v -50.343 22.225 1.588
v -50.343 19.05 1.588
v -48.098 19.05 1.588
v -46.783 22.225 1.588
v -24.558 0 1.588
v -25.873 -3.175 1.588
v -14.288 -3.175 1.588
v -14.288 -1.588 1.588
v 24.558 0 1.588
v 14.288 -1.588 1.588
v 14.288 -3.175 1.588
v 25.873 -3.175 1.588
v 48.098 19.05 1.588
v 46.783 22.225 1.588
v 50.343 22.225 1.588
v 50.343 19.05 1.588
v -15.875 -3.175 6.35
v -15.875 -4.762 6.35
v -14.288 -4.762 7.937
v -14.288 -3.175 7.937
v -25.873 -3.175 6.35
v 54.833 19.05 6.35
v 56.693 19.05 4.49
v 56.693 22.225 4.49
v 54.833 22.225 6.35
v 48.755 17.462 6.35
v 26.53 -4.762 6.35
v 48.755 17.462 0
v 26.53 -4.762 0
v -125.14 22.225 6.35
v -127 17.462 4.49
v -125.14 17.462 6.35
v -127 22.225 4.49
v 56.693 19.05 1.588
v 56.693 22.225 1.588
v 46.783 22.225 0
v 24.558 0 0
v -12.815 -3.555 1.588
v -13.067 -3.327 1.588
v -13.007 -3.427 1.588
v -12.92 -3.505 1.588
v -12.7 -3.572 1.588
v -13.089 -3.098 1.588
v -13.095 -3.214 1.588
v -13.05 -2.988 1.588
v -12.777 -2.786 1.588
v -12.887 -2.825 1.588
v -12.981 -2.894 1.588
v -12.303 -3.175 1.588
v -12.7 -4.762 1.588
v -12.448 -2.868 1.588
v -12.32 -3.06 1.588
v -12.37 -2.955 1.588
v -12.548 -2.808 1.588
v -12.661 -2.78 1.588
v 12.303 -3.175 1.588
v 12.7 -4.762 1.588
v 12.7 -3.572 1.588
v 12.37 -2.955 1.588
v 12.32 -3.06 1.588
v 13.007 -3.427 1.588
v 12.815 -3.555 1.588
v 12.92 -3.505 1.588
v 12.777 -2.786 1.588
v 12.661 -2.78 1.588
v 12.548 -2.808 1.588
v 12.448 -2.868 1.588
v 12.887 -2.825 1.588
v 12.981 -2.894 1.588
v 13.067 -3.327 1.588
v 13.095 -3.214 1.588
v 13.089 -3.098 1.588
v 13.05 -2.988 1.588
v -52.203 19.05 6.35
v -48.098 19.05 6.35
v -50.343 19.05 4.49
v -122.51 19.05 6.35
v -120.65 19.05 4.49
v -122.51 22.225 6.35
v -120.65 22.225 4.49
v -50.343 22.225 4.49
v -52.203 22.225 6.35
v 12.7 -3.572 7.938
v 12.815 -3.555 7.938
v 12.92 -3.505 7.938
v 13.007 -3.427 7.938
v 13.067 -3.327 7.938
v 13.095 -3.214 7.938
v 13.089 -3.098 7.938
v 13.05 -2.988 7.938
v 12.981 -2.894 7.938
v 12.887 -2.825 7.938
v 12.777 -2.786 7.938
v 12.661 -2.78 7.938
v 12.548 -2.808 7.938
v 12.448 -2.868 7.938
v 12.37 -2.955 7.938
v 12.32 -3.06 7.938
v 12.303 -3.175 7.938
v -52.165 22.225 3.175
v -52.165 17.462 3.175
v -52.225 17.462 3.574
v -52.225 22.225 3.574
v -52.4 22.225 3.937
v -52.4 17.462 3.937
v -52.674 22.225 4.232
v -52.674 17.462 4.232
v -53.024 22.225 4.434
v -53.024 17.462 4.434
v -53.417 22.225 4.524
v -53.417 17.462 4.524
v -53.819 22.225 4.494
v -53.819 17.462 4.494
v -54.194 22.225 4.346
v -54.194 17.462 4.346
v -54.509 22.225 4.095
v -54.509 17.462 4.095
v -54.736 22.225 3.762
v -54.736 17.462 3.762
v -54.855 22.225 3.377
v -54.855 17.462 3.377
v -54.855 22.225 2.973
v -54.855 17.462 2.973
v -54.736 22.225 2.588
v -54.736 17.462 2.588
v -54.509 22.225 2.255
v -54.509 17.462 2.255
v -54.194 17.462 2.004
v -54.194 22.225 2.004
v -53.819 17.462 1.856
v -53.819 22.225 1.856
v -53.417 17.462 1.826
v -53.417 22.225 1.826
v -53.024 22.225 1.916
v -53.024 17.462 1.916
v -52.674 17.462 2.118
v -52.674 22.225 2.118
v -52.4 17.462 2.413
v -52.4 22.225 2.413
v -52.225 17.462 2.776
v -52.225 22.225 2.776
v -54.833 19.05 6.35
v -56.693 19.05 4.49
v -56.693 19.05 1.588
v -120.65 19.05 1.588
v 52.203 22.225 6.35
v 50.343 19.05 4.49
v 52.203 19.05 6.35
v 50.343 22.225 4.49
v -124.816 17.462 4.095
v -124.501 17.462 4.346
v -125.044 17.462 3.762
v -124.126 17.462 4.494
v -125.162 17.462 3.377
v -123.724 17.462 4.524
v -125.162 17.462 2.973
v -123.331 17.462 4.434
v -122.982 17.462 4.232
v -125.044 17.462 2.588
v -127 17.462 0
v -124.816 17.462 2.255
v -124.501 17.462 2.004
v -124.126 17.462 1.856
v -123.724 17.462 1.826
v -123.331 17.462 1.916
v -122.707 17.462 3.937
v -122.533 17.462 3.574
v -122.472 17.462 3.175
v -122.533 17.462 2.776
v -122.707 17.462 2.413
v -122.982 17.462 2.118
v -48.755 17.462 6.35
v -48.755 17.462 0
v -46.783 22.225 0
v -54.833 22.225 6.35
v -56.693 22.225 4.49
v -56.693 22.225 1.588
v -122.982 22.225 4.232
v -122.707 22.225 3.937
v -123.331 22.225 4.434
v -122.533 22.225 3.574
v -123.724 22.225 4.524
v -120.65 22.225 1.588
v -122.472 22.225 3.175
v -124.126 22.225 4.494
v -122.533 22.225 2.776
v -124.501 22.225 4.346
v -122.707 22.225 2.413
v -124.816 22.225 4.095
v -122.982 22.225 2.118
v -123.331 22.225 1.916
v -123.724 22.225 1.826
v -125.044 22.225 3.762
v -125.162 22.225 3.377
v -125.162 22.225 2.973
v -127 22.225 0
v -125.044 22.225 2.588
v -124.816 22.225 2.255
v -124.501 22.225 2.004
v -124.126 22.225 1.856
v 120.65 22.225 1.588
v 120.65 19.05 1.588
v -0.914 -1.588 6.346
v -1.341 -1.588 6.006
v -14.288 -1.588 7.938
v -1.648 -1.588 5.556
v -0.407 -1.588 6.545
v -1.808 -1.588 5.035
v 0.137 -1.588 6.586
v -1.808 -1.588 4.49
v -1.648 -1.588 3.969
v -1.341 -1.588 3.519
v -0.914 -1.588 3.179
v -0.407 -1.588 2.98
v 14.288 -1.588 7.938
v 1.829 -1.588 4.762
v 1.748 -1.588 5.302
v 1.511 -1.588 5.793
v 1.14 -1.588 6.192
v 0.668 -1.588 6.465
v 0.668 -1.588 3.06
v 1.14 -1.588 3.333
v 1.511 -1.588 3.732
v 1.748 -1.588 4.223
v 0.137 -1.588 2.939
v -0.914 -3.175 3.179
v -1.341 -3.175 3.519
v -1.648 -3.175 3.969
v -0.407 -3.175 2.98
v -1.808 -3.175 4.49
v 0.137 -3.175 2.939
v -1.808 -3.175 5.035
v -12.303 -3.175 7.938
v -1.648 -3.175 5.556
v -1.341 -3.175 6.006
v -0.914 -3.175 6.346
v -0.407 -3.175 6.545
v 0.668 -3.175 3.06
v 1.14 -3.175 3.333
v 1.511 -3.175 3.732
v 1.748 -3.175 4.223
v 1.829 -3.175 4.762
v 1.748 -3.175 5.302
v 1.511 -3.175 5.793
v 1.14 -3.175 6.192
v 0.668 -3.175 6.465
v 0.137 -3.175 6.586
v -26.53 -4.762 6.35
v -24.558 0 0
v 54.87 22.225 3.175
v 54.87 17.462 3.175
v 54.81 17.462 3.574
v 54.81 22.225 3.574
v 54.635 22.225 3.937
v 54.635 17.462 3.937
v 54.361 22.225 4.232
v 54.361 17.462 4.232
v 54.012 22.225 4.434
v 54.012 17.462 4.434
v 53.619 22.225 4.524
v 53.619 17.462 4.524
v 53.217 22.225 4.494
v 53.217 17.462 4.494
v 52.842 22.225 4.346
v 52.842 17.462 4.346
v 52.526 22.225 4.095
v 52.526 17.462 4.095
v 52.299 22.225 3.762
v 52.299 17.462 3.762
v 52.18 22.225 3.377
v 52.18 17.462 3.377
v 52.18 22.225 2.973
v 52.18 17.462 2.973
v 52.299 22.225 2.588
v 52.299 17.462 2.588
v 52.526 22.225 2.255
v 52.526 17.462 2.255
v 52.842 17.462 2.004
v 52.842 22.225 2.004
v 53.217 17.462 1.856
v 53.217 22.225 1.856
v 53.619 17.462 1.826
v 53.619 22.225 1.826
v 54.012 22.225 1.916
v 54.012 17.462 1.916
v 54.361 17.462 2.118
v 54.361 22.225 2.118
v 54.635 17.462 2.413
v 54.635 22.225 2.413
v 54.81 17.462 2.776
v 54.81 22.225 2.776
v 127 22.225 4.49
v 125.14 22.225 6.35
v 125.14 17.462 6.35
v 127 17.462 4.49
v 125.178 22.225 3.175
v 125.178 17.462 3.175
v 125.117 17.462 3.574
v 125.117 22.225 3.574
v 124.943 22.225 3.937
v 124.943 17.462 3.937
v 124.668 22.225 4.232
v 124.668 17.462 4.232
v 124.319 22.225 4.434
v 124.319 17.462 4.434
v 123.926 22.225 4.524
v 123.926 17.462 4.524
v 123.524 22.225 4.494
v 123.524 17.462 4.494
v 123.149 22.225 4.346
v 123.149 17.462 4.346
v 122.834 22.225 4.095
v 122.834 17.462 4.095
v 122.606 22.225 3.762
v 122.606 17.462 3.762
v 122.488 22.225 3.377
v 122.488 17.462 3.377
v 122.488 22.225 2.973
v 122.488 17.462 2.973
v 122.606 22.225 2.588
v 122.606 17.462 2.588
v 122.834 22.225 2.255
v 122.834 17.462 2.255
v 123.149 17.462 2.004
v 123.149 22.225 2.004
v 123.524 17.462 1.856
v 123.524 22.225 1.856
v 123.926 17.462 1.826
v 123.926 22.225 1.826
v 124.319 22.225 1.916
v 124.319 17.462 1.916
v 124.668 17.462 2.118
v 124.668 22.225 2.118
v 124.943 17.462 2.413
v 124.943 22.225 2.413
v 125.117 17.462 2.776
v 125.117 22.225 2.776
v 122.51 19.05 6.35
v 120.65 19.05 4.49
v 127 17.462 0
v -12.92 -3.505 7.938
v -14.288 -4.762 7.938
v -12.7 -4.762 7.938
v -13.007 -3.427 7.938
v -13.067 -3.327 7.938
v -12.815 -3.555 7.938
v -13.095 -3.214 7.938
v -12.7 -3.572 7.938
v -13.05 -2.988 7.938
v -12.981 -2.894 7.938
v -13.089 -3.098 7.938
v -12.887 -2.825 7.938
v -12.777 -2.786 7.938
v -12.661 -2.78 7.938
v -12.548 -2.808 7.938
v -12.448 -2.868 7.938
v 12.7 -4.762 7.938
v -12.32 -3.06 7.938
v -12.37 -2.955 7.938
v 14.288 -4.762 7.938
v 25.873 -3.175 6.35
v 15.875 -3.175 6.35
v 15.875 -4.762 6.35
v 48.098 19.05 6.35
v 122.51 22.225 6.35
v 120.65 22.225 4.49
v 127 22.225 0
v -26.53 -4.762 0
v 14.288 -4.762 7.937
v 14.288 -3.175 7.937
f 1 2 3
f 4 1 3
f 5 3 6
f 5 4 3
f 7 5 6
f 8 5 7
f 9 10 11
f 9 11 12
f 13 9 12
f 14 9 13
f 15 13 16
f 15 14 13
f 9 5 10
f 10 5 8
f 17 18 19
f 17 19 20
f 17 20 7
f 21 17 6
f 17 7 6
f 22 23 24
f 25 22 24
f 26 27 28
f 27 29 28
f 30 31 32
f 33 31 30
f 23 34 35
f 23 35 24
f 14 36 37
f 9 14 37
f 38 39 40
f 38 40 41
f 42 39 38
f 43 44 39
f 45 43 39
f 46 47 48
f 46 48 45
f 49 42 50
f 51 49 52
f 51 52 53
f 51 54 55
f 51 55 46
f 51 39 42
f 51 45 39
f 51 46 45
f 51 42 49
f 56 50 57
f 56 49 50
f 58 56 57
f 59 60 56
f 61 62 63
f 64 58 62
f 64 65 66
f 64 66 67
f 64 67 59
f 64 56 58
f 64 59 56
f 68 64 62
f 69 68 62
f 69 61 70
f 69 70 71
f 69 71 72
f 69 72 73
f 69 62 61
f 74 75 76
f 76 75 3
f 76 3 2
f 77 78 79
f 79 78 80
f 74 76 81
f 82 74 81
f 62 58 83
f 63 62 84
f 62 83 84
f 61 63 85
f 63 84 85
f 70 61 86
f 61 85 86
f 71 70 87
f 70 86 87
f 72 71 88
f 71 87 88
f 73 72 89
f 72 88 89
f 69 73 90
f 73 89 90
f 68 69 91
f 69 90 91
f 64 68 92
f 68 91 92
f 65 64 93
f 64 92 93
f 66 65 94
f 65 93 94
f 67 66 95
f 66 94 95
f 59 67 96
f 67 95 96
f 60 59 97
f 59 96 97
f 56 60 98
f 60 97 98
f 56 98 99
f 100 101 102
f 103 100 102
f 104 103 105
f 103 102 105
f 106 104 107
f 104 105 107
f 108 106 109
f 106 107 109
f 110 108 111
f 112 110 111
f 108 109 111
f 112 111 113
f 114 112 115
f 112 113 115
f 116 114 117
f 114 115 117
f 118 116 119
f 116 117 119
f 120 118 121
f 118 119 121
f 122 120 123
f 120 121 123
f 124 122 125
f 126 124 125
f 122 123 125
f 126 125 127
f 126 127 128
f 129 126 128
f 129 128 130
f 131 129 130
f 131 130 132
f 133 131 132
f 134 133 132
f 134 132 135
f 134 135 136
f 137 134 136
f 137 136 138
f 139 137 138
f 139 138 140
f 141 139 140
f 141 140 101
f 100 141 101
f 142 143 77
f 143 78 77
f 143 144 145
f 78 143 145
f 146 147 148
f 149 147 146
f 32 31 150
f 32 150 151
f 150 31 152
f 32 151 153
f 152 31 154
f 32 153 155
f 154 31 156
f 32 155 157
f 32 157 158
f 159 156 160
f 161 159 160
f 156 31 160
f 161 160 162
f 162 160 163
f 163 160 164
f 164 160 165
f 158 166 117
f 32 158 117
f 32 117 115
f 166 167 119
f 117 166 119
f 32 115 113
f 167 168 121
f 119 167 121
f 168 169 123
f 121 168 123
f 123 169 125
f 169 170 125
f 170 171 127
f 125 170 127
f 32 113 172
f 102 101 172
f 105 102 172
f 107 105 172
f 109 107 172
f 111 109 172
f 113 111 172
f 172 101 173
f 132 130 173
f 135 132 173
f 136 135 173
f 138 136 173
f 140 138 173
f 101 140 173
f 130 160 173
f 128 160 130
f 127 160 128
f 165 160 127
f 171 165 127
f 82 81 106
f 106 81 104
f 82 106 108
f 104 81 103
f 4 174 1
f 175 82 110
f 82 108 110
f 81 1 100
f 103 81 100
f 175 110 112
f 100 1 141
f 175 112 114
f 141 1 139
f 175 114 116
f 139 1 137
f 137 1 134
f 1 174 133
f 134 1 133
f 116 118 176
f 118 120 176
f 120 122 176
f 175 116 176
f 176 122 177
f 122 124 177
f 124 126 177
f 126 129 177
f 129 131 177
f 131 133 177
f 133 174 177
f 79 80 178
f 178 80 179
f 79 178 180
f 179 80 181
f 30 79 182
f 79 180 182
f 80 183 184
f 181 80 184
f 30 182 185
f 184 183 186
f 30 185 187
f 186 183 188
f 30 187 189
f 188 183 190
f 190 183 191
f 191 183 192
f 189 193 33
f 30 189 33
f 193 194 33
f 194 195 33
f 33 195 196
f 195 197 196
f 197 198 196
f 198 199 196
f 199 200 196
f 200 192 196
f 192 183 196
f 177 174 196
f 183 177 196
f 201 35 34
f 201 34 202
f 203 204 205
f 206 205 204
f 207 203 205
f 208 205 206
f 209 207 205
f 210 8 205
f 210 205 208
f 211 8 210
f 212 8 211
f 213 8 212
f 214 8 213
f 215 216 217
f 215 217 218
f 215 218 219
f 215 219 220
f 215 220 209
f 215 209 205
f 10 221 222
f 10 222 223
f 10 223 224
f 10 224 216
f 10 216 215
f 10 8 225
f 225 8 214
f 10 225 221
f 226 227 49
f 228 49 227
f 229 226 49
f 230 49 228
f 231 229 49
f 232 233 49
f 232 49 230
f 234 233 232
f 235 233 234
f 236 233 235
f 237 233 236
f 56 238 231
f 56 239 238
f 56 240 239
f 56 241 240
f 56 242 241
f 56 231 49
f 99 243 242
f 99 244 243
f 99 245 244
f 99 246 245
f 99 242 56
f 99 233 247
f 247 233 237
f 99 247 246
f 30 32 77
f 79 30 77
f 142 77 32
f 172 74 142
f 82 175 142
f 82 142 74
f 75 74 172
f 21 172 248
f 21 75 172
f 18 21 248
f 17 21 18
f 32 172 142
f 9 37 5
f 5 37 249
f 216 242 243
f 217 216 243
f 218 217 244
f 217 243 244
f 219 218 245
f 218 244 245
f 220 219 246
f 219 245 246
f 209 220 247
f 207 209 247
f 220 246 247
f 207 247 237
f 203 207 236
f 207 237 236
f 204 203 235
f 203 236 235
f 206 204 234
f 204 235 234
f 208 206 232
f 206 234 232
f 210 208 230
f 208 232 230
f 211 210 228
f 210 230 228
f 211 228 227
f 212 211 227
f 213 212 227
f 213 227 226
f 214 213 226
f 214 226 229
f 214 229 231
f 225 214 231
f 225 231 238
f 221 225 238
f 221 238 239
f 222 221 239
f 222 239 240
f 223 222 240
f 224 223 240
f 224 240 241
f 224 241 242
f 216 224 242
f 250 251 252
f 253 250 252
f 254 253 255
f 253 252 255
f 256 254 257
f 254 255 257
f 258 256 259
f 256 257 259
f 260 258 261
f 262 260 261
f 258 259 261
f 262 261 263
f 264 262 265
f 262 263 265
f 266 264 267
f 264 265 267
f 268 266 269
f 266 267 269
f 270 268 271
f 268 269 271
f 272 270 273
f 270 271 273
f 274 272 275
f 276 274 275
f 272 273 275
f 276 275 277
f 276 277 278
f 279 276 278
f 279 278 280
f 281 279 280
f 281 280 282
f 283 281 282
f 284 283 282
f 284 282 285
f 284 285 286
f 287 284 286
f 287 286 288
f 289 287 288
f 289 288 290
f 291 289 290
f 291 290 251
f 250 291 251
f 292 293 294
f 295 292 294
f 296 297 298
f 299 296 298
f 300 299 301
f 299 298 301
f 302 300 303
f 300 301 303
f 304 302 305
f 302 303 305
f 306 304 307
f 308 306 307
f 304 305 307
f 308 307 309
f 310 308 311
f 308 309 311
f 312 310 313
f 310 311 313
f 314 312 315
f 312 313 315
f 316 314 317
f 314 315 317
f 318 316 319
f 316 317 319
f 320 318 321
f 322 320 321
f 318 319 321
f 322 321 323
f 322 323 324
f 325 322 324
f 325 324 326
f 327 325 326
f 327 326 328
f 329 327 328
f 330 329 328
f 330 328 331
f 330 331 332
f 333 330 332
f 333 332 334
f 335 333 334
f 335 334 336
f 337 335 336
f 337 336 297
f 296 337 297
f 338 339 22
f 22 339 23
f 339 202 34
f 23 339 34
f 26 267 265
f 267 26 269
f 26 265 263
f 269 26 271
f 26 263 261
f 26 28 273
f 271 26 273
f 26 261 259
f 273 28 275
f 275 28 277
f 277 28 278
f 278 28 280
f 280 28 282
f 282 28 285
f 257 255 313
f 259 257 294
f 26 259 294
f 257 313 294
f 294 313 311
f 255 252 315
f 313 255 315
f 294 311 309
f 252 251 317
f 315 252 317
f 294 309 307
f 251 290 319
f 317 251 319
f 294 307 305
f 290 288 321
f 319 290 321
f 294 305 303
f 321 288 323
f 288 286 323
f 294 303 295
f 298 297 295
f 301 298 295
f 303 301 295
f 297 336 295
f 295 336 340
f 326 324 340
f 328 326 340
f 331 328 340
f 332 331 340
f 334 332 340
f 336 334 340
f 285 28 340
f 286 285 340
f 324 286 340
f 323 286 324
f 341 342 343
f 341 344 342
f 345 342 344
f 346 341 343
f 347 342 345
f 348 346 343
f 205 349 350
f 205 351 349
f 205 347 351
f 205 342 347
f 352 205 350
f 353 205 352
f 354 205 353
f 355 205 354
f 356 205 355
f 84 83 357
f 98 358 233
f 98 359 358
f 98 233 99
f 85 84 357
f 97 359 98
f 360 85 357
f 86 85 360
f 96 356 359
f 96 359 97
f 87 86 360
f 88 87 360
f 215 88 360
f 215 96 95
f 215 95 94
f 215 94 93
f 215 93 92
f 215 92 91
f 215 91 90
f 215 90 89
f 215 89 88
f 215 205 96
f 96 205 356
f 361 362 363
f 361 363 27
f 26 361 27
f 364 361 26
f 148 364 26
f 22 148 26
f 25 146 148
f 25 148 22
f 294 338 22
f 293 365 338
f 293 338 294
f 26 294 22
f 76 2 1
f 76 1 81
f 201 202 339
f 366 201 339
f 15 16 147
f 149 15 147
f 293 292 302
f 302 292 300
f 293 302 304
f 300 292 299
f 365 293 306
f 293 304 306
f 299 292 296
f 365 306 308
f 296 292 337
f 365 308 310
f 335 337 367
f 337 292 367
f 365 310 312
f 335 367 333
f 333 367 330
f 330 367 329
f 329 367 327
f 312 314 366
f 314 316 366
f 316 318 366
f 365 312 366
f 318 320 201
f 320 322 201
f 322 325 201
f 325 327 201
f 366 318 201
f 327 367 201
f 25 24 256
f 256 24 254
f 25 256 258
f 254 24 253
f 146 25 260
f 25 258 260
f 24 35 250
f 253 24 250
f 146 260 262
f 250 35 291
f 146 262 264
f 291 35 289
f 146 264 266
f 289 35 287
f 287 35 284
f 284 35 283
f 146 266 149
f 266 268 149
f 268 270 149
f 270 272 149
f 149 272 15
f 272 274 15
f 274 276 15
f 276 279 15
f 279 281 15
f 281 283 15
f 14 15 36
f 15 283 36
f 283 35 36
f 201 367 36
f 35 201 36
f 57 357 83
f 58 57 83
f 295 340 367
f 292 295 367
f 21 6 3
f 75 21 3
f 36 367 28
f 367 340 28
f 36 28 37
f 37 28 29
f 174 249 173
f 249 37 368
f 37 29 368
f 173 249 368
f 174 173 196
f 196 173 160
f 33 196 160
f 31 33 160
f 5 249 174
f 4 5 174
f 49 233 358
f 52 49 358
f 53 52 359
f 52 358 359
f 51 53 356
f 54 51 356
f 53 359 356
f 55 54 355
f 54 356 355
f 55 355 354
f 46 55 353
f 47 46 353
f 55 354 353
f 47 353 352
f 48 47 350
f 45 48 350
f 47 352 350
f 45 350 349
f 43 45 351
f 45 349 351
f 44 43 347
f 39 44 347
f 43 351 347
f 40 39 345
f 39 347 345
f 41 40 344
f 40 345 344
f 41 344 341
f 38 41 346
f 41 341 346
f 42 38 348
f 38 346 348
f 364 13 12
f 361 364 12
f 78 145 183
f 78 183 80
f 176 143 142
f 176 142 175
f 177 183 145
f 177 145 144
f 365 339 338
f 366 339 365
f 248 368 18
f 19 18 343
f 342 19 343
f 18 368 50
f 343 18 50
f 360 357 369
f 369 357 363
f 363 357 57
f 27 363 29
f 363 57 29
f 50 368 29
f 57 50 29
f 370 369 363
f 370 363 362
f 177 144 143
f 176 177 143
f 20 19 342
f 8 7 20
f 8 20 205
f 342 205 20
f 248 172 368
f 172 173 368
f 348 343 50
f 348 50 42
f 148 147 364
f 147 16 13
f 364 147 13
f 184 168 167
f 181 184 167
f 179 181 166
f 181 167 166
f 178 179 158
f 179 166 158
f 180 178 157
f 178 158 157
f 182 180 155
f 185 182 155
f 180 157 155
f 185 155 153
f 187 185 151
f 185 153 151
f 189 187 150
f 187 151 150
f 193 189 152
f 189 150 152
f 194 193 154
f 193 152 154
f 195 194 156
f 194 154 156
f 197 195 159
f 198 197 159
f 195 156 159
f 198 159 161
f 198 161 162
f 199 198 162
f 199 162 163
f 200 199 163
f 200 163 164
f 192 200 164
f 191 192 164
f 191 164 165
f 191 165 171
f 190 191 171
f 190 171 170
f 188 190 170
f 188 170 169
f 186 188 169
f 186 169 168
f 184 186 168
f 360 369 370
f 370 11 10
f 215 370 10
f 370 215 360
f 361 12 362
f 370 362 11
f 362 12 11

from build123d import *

# Parameters (mm, degrees)
F1_DEPTH  = 1.5875
F3_DEPTH  = 4.7625
F4_W      = 6.35
F4_H      = 6.35
F5_DEPTH  = 3.175
F6_SIZE   = 1.8598642
F7_W      = 28.575
F7_H      = 3.175
F8_DEPTH  = 1.5875
F9_W      = 25.4
F9_H      = 1.5875
F10_DEPTH = 6.35
F11_SIZE  = 1.58749
F12_R     = 1.35255
F12_R_2   = 1.8288
F13_DEPTH = 25.4
F14_R     = 0.396875
F15_DEPTH = 6.35


# Not quite as in the source:
# - a fillet or chamfer is up to 0.001 mm smaller than in the source, because OpenCascade refuses the exact size


with BuildPart() as f1:
    # F0 (on Top) → F1 (new body)
    with BuildSketch(Plane.XY):
        Polygon((-46.7826079092, 22.225), (-127, 22.225), (-127, 17.4625), (-48.7553, 17.4625), (-26.5303, -4.7625), (26.5303, -4.7625), (48.7553, 17.4625), (127, 17.4625), (127, 22.225), (46.7826079092, 22.225), (24.5576079092, 0), (-24.5576079092, 0), align=None)
    extrude(amount=F1_DEPTH)

    # F2 (on face) → F3 (join)
    with BuildSketch(Plane.XY.offset(1.5875)):
        Polygon((-127, 19.05), (-127, 17.4625), (-48.7553, 17.4625), (-26.5303, -4.7625), (26.5303, -4.7625), (48.7553, 17.4625), (127, 17.4625), (127, 19.05), (48.0977359697, 19.05), (25.8727359697, -3.175), (14.2875, -3.175), (14.2875, -1.5875), (-14.2875, -1.5875), (-14.2875, -3.175), (-25.8727359697, -3.175), (-48.0977359697, 19.05), align=None)
    extrude(amount=F3_DEPTH)

    # F4 (on face) → F5 (join, through all)
    with BuildSketch(Plane(origin=(0, 19.05, 0), x_dir=(-1, 0, 0), z_dir=(0, 1, 0))):
        with Locations((-53.5178, 3.175)):
            Rectangle(F4_W, F4_H)
        with Locations((-123.825, 3.175)):
            Rectangle(F4_W, F4_H)
        with Locations((123.825, 3.175)):
            Rectangle(F4_W, F4_H)
        with Locations((53.5178, 3.175)):
            Rectangle(F4_W, F4_H)
    extrude(amount=F5_DEPTH)

    # F6
    f6_edges = [f1.edges().sort_by_distance(p)[0] for p in [
        (-127, 19.84375, 6.35),
        (-120.65, 20.6375, 6.35),
        (-56.6928, 20.6375, 6.35),
        (-50.3428, 20.6375, 6.35),
        (50.3428, 20.6375, 6.35),
        (56.6928, 20.6375, 6.35),
        (120.65, 20.6375, 6.35),
        (127, 19.84375, 6.35),
    ]]
    chamfer(f6_edges, length=F6_SIZE)

    # F7 (on face) → F8 (join)
    with BuildSketch(Plane.XY.offset(6.35)):
        with Locations((0, -3.175)):
            Rectangle(F7_W, F7_H)
    extrude(amount=F8_DEPTH)

    # F9 (on face) → F10 (cut, through all)
    with BuildSketch(Plane.XY.offset(7.9375)):
        with Locations((0, -3.96875)):
            Rectangle(F9_W, F9_H)
    extrude(amount=-F10_DEPTH, mode=Mode.SUBTRACT)

    # F11 (size 1.5875 in the source; OpenCascade refuses exactly that, so slightly less here)
    f11_edges = [f1.edges().sort_by_distance(p)[0] for p in [
        (-14.2875, -3.96875, 6.35),
        (14.2875, -3.96875, 6.35),
    ]]
    chamfer(f11_edges, length=F11_SIZE)

    # F12 (on face) → F13 (cut, through all)
    with BuildSketch(Plane.XZ.offset(3.175)):
        with Locations((53.5178, 3.175)):
            Circle(F12_R)
        with Locations((123.825, 3.175)):
            Circle(F12_R)
        with Locations((-123.825, 3.175)):
            Circle(F12_R)
        with Locations((-53.5178, 3.175)):
            Circle(F12_R)
        with Locations((0, 4.7625)):
            Circle(F12_R_2)
    extrude(amount=-F13_DEPTH, mode=Mode.SUBTRACT)

    # F14 (on face) → F15 (cut, through all)
    with BuildSketch(Plane.XY.offset(7.9375)):
        with Locations((12.7, -3.175)):
            Circle(F14_R)
        with Locations((-12.7, -3.175)):
            Circle(F14_R)
    extrude(amount=-F15_DEPTH, mode=Mode.SUBTRACT)


solid = f1.part
